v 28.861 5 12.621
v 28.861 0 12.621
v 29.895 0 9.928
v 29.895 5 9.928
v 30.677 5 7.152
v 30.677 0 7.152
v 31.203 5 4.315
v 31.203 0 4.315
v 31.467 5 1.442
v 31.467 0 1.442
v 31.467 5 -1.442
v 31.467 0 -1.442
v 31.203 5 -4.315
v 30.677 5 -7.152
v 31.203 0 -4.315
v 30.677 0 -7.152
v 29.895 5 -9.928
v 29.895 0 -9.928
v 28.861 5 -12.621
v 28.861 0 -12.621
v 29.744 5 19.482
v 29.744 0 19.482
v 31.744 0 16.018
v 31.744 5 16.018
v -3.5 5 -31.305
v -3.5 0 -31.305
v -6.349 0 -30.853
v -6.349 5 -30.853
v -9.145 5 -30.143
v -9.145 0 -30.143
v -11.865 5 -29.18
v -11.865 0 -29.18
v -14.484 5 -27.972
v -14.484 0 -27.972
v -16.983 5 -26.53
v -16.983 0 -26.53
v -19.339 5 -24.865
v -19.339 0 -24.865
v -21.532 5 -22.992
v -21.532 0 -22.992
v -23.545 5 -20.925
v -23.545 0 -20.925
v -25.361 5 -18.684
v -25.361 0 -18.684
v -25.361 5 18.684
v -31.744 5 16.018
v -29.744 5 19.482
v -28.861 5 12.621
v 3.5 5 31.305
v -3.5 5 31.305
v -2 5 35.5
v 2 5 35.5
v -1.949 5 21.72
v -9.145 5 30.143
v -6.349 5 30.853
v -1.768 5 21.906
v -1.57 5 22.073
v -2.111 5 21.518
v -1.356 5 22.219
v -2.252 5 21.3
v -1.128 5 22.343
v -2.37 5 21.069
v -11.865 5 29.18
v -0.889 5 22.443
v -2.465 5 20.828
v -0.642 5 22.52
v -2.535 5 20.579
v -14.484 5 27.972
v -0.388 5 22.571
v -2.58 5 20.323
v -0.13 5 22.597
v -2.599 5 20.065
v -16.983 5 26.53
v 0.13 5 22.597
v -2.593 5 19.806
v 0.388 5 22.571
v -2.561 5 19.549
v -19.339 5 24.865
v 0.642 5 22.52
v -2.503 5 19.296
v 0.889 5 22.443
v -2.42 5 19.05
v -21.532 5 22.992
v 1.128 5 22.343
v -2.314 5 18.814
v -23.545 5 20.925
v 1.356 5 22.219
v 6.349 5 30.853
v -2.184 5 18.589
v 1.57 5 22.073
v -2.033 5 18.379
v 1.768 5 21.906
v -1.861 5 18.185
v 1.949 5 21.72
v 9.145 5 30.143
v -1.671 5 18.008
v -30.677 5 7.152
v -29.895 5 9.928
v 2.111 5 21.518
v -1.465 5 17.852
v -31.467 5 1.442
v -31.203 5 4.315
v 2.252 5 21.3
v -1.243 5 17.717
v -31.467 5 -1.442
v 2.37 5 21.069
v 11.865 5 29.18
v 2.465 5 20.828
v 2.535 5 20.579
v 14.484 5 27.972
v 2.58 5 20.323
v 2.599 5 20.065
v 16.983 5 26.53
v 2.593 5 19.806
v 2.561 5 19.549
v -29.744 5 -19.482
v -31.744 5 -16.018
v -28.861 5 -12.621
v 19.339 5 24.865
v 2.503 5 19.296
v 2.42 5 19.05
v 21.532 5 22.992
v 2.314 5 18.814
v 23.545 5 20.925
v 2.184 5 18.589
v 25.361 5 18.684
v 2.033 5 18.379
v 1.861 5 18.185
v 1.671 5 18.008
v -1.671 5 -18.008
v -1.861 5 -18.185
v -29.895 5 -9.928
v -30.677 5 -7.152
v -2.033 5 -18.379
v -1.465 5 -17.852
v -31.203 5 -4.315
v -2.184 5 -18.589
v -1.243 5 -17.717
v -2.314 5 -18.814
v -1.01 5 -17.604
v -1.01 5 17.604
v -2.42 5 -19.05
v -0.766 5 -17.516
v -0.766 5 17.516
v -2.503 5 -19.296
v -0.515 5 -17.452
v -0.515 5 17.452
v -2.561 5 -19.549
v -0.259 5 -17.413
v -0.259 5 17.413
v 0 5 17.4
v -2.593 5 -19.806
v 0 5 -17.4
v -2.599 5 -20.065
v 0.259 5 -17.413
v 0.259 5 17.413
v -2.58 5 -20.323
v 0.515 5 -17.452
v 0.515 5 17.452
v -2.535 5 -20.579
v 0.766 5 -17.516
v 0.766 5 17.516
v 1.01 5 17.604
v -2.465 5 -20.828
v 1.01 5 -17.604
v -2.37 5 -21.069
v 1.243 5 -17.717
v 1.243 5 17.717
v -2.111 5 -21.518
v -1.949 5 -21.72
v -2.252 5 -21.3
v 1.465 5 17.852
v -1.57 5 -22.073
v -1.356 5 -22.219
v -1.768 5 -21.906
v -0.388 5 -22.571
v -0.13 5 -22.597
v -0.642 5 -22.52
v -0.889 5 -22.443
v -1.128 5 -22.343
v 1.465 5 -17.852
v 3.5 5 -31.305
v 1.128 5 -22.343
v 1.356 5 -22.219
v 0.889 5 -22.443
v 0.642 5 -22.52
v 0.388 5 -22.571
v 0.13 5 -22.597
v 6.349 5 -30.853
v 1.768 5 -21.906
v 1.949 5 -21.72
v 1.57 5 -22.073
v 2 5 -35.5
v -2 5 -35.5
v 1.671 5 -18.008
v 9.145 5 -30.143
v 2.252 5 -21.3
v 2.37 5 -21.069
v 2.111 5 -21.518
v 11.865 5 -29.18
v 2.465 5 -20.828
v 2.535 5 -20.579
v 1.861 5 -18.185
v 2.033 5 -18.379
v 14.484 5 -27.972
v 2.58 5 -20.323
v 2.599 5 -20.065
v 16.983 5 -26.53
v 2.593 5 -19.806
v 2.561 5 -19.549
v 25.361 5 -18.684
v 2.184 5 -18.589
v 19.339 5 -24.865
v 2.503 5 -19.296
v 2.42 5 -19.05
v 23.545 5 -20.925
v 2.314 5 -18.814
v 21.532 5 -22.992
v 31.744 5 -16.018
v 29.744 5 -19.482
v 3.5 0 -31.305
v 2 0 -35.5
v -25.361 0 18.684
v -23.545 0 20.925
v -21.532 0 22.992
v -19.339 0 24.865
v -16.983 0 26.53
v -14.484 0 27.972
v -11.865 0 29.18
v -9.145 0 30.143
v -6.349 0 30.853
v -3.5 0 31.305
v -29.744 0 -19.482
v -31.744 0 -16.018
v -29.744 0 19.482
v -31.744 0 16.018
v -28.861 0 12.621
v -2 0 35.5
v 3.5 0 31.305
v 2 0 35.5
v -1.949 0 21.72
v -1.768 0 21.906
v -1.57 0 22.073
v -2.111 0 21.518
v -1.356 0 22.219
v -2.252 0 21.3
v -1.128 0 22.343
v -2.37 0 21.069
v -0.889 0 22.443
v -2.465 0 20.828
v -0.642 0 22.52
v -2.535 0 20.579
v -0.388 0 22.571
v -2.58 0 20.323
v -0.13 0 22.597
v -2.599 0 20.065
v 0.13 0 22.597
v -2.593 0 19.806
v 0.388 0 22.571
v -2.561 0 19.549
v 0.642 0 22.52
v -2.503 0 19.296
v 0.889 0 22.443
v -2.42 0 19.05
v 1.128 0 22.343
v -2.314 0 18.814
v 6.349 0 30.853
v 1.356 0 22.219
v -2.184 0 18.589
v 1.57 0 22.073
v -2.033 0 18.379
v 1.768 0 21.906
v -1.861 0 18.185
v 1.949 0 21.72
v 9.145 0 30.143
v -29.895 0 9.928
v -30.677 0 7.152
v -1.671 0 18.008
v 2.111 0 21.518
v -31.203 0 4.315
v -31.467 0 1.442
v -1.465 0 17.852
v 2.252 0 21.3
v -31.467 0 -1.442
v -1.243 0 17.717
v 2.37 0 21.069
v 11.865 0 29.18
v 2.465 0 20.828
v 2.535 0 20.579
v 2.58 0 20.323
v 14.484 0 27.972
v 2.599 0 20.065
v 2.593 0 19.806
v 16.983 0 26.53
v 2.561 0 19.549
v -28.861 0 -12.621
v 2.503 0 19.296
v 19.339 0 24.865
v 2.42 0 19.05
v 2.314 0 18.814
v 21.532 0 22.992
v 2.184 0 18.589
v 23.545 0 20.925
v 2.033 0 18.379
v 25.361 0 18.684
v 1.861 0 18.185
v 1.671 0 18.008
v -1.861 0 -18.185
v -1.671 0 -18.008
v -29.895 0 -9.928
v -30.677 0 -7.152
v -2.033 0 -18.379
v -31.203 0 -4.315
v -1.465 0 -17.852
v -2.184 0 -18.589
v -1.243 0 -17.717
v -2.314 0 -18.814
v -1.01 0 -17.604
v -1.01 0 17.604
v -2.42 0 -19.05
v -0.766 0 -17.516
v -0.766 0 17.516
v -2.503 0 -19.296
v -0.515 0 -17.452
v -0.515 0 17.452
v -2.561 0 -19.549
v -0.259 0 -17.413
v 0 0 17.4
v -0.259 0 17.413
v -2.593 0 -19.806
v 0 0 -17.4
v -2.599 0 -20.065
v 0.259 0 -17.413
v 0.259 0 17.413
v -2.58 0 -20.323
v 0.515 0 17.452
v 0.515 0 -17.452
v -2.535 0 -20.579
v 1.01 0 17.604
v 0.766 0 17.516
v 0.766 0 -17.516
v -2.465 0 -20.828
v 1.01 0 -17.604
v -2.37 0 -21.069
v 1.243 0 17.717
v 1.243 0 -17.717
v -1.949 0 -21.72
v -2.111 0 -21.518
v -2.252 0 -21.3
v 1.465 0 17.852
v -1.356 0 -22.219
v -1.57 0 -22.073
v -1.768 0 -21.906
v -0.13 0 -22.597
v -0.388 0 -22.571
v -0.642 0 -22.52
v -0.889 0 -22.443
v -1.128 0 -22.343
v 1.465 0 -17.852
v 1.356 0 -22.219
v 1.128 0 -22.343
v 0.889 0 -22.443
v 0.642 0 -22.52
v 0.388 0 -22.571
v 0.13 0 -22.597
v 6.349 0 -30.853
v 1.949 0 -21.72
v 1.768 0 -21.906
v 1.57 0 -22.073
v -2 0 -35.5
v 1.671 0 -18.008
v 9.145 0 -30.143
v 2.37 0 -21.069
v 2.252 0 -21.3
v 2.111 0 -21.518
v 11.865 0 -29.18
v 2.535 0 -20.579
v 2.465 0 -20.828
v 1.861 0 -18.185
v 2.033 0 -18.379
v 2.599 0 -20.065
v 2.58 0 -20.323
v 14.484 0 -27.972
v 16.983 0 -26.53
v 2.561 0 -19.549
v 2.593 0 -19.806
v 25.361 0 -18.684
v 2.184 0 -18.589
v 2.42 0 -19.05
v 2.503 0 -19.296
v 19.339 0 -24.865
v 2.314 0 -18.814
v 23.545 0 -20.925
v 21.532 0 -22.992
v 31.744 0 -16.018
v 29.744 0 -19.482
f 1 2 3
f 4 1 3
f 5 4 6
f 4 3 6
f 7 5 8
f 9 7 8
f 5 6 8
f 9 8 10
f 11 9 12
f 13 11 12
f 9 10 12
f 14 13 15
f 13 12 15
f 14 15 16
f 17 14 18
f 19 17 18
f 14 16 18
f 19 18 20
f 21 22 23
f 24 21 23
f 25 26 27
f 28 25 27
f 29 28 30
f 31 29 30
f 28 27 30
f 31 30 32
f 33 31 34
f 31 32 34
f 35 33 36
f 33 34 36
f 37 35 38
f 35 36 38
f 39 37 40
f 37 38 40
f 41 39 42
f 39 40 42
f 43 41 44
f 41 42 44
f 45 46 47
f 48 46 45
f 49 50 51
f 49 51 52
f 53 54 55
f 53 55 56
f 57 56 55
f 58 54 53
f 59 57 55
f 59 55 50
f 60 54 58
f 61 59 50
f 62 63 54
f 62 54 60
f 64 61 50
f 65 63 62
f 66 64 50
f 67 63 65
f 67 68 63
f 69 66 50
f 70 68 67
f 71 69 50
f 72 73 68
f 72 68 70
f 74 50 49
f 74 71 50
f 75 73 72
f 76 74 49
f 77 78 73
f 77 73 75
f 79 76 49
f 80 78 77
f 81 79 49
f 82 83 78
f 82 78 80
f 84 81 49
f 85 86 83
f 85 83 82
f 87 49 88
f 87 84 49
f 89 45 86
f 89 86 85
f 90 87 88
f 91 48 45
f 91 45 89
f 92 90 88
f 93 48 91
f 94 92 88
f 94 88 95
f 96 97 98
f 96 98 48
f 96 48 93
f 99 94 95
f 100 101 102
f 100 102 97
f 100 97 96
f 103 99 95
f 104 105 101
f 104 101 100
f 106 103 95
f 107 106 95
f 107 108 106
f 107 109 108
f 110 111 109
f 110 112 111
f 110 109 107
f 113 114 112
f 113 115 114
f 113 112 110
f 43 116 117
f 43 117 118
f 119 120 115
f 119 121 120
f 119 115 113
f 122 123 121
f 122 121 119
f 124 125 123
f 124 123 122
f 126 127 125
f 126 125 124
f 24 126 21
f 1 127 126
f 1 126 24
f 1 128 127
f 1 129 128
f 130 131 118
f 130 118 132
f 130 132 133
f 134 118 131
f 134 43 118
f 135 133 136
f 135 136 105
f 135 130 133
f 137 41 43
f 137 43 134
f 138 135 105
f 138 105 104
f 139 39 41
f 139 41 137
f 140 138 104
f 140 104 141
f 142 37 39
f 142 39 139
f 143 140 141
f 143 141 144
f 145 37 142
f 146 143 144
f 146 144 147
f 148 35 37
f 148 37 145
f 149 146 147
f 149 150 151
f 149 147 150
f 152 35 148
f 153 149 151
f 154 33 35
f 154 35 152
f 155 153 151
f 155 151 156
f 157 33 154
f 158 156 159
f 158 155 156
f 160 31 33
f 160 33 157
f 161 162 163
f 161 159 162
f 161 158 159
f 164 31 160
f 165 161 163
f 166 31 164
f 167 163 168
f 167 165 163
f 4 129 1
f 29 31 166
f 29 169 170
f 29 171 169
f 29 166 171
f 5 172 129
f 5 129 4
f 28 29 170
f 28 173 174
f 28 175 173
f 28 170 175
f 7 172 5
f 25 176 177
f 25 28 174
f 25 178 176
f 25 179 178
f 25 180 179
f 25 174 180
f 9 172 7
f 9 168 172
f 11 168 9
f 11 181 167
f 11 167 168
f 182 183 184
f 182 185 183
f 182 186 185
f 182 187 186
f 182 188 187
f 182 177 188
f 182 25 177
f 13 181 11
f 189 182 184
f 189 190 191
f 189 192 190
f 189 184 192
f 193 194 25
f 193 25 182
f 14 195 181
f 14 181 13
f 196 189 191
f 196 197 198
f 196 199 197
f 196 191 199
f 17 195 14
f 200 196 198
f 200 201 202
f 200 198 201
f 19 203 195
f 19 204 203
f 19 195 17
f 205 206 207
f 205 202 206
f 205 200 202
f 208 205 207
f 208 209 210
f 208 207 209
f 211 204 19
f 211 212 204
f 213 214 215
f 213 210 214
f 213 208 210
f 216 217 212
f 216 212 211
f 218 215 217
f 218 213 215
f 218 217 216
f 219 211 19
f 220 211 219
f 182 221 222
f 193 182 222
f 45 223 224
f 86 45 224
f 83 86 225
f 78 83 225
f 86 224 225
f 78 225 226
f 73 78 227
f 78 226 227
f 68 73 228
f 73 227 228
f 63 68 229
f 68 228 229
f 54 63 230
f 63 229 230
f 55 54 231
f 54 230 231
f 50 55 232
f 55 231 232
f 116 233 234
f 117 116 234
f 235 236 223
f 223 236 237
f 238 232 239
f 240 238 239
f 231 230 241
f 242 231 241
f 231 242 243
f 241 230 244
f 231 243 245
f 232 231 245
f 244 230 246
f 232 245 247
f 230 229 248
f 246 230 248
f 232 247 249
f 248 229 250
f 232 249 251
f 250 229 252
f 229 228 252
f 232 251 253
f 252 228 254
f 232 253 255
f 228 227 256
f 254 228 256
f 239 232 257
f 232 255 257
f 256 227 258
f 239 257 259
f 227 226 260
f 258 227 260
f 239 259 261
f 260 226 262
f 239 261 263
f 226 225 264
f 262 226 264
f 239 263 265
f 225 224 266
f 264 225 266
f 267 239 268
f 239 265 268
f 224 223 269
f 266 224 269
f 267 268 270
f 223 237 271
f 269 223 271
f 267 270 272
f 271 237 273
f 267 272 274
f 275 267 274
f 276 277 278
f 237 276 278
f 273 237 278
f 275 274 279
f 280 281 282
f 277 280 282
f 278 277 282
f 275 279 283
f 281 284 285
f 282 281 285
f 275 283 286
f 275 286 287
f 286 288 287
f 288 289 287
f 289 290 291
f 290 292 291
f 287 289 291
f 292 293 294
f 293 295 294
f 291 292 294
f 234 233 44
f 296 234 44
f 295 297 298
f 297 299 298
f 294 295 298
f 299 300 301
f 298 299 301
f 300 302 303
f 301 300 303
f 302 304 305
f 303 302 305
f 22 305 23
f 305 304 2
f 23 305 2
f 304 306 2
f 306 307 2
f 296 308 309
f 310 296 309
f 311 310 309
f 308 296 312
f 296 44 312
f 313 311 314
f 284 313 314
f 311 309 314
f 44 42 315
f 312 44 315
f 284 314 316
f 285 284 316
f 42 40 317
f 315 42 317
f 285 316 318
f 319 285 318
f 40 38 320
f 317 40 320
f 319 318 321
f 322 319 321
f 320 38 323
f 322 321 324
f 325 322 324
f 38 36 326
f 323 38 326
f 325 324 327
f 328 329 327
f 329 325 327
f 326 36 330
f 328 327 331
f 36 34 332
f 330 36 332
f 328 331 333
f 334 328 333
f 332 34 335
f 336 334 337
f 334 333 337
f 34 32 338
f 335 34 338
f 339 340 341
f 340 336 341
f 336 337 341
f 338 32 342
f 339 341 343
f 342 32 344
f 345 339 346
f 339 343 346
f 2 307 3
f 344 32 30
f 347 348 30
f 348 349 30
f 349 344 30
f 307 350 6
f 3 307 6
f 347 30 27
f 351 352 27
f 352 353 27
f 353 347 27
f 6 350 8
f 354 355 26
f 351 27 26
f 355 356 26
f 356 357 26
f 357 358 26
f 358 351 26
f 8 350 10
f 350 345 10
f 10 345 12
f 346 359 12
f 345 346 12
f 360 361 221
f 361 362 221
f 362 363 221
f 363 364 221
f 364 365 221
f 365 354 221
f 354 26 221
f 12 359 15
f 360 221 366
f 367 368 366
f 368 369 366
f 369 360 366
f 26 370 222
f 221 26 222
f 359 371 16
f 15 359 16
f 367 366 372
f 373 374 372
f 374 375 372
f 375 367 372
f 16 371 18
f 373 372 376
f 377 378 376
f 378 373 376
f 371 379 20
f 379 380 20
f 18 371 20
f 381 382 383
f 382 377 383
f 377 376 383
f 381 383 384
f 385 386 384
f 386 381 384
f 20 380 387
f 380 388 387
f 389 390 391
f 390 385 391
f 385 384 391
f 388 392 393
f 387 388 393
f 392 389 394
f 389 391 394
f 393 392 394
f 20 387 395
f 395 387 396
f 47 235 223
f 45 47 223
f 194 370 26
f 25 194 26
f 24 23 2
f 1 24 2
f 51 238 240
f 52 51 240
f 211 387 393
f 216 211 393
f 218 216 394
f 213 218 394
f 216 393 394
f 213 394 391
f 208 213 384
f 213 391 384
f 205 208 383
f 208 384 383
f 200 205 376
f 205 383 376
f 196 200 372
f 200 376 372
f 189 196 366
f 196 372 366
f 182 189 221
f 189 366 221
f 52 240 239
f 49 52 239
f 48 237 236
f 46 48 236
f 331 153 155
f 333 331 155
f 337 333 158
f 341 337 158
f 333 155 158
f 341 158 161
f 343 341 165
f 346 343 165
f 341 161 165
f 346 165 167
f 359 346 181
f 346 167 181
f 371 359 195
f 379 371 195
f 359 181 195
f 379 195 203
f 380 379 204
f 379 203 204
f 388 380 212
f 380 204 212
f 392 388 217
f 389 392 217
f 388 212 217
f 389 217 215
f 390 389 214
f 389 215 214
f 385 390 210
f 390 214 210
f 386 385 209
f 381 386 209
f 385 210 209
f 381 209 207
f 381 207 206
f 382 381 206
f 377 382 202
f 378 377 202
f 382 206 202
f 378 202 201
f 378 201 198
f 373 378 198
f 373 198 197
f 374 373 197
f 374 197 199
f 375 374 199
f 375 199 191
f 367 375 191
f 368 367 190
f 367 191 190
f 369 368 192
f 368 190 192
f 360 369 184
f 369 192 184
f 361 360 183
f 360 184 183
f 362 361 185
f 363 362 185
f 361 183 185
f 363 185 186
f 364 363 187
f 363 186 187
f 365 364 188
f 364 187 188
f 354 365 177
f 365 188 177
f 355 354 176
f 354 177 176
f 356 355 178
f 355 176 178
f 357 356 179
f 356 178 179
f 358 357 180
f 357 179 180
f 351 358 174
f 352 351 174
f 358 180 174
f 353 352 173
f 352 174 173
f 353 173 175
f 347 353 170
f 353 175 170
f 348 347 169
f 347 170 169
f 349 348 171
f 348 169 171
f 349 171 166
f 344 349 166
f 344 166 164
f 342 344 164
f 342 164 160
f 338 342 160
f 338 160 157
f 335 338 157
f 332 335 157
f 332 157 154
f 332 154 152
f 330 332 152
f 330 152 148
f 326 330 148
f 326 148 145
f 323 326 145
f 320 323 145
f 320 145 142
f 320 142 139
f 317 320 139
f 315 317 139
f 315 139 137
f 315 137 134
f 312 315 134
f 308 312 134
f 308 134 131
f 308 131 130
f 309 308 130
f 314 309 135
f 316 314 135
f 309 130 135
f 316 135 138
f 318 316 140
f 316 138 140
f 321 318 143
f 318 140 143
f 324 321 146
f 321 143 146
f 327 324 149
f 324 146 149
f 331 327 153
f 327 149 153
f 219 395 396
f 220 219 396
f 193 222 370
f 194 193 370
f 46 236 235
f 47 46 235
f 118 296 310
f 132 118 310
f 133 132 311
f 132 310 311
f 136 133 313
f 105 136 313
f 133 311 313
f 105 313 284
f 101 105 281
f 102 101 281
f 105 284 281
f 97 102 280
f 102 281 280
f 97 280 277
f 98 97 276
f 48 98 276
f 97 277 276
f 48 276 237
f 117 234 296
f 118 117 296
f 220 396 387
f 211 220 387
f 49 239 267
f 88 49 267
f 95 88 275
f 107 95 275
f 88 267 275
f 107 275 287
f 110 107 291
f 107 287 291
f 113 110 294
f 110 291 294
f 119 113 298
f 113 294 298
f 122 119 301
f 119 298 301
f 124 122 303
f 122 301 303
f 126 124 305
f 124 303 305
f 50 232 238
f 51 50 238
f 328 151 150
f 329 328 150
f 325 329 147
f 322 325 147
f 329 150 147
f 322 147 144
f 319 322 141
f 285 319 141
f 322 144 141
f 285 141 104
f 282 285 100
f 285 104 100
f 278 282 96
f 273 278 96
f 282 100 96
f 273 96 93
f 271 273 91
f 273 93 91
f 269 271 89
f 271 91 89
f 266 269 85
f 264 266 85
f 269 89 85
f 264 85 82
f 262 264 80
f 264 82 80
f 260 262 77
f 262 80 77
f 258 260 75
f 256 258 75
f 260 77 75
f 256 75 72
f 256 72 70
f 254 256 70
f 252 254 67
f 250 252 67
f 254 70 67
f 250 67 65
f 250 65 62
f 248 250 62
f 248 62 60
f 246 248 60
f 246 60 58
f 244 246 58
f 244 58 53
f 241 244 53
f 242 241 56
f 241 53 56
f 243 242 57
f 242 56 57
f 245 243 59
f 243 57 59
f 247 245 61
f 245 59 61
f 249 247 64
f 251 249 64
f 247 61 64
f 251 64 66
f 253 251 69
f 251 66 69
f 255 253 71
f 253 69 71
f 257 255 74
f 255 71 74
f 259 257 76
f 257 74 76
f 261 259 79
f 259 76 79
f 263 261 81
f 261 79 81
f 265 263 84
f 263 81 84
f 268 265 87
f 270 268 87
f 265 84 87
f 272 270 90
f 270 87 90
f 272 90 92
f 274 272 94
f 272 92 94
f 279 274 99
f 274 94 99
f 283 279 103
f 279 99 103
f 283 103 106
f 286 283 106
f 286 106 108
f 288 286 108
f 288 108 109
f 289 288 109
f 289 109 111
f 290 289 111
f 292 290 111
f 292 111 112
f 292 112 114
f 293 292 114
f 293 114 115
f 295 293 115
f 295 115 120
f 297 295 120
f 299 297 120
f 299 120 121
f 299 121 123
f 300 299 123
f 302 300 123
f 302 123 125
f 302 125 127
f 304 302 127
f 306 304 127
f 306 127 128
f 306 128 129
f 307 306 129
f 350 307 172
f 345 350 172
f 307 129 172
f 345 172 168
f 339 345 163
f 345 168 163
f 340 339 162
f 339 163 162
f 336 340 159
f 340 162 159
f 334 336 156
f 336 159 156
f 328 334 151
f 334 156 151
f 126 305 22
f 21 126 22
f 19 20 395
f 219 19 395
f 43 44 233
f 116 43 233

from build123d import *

# Parameters (mm, degrees)
BOSS_EXTRUDE1_DEPTH = 5
SKETCH2_R           = 2.6
CUT_EXTRUDE1_DEPTH  = 5


with BuildPart() as part:
    # Sketch1 → Boss-Extrude1 (new body)
    with BuildSketch(Plane(origin=(0, 0, 0), x_dir=(1, 0, 0), z_dir=(0, 1, 0))):
        with BuildLine():
            Line((2, 35.5), (-2, 35.5))
            Line((-2, 35.5), (-3.5, 31.304951685))
            ThreePointArc((-3.5, 31.304951685), (-15.75, 27.279800219), (-25.360883423, 18.683564756))
            Line((-25.360883423, 18.683564756), (-29.743901834, 19.482050808))
            Line((-29.743901834, 19.482050808), (-31.743901834, 16.017949192))
            Line((-31.743901834, 16.017949192), (-28.860883423, 12.621386929))
            ThreePointArc((-28.860883423, 12.621386929), (-31.5, 0), (-28.860883423, -12.621386929))
            Line((-28.860883423, -12.621386929), (-31.743901834, -16.017949192))
            Line((-31.743901834, -16.017949192), (-29.743901834, -19.482050808))
            Line((-29.743901834, -19.482050808), (-25.360883423, -18.683564756))
            ThreePointArc((-25.360883423, -18.683564756), (-15.75, -27.279800219), (-3.5, -31.304951685))
            Line((-3.5, -31.304951685), (-2, -35.5))
            Line((-2, -35.5), (2, -35.5))
            Line((2, -35.5), (3.5, -31.304951685))
            ThreePointArc((3.5, -31.304951685), (15.75, -27.279800219), (25.360883423, -18.683564756))
            Line((25.360883423, -18.683564756), (29.743901834, -19.482050808))
            Line((29.743901834, -19.482050808), (31.743901834, -16.017949192))
            Line((31.743901834, -16.017949192), (28.860883423, -12.621386929))
            ThreePointArc((28.860883423, -12.621386929), (31.5, 0), (28.860883423, 12.621386929))
            Line((28.860883423, 12.621386929), (31.743901834, 16.017949192))
            Line((31.743901834, 16.017949192), (29.743901834, 19.482050808))
            Line((29.743901834, 19.482050808), (25.360883423, 18.683564756))
            ThreePointArc((25.360883423, 18.683564756), (15.75, 27.279800219), (3.5, 31.304951685))
            Line((3.5, 31.304951685), (2, 35.5))
        make_face()
    extrude(amount=BOSS_EXTRUDE1_DEPTH)

    # Sketch2 → Cut-Extrude1 (cut)
    with BuildSketch(Plane(origin=(0, 5, 0), x_dir=(1, 0, 0), z_dir=(0, 1, 0))):
        with Locations(Location((0, 20, 0), (0, 0, 270))):
            Circle(SKETCH2_R)
        with Locations(Location((0, -20, 0), (0, 0, 90))):
            Circle(SKETCH2_R)
    extrude(amount=-CUT_EXTRUDE1_DEPTH, mode=Mode.SUBTRACT)


solid = part.part
